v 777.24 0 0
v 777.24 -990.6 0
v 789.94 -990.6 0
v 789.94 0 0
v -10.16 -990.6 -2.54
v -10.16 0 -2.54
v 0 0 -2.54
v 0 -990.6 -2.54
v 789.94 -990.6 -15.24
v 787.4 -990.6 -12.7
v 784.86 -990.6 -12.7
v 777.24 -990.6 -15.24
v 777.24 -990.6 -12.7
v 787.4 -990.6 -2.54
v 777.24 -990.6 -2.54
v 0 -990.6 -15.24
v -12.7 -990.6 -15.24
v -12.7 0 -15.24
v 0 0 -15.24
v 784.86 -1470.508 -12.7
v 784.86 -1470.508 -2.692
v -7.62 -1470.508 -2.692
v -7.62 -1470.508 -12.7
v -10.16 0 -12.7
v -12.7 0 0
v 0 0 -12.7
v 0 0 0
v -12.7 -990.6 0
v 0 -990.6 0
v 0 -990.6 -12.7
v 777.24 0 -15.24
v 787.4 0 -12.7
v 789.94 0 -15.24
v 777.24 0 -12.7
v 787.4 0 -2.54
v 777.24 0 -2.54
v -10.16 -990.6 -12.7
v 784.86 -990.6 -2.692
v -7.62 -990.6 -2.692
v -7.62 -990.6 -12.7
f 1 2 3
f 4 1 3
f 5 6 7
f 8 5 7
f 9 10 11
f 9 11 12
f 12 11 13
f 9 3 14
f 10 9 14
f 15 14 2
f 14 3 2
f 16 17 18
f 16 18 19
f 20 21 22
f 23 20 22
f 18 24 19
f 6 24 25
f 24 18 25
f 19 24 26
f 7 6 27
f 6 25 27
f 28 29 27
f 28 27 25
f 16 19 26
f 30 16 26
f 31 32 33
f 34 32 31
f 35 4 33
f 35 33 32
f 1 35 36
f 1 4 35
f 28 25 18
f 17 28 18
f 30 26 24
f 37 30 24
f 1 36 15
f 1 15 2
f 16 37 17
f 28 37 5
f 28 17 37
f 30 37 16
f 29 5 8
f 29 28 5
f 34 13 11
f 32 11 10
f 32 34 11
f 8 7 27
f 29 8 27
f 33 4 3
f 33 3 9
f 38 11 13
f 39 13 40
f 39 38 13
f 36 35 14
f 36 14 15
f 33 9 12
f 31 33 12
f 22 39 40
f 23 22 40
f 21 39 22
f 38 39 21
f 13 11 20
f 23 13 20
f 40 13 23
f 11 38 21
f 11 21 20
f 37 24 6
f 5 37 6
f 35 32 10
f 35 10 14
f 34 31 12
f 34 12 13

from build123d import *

# Parameters (mm, degrees)
F1_DEPTH = 990.6
F3_DEPTH = 479.9076


with BuildPart() as f1:
    # F0 (on Front) → F1 (new body)
    with BuildSketch(Plane.XZ):
        Polygon((0, -2.54), (0, 0), (-12.7, 0), (-12.7, -15.24), (0, -15.24), (0, -12.7), (-10.16, -12.7), (-10.16, -2.54), align=None)
    extrude(amount=F1_DEPTH)


with BuildPart() as f3:
    # F2 (on face) → F3 (new body)
    with BuildSketch(Plane.XZ.offset(990.6)):
        Polygon((388.62, -2.6924), (-7.62, -2.6924), (-7.62, -12.7), (0, -12.7), (388.62, -12.7), align=None)
    extrude(amount=F3_DEPTH)

    # F5: F3, F1 across plane


with BuildPart() as f3_1:
    add(f3.part)
    add(f3.part.mirror(Plane(origin=(388.62, -1230.5538, -7.6962), x_dir=(0, 1, 0), z_dir=(1, 0, 0))))
    add(f1.part.mirror(Plane(origin=(388.62, -1230.5538, -7.6962), x_dir=(0, 1, 0), z_dir=(1, 0, 0))))


solid = Compound([f1.part, f3_1.part])
